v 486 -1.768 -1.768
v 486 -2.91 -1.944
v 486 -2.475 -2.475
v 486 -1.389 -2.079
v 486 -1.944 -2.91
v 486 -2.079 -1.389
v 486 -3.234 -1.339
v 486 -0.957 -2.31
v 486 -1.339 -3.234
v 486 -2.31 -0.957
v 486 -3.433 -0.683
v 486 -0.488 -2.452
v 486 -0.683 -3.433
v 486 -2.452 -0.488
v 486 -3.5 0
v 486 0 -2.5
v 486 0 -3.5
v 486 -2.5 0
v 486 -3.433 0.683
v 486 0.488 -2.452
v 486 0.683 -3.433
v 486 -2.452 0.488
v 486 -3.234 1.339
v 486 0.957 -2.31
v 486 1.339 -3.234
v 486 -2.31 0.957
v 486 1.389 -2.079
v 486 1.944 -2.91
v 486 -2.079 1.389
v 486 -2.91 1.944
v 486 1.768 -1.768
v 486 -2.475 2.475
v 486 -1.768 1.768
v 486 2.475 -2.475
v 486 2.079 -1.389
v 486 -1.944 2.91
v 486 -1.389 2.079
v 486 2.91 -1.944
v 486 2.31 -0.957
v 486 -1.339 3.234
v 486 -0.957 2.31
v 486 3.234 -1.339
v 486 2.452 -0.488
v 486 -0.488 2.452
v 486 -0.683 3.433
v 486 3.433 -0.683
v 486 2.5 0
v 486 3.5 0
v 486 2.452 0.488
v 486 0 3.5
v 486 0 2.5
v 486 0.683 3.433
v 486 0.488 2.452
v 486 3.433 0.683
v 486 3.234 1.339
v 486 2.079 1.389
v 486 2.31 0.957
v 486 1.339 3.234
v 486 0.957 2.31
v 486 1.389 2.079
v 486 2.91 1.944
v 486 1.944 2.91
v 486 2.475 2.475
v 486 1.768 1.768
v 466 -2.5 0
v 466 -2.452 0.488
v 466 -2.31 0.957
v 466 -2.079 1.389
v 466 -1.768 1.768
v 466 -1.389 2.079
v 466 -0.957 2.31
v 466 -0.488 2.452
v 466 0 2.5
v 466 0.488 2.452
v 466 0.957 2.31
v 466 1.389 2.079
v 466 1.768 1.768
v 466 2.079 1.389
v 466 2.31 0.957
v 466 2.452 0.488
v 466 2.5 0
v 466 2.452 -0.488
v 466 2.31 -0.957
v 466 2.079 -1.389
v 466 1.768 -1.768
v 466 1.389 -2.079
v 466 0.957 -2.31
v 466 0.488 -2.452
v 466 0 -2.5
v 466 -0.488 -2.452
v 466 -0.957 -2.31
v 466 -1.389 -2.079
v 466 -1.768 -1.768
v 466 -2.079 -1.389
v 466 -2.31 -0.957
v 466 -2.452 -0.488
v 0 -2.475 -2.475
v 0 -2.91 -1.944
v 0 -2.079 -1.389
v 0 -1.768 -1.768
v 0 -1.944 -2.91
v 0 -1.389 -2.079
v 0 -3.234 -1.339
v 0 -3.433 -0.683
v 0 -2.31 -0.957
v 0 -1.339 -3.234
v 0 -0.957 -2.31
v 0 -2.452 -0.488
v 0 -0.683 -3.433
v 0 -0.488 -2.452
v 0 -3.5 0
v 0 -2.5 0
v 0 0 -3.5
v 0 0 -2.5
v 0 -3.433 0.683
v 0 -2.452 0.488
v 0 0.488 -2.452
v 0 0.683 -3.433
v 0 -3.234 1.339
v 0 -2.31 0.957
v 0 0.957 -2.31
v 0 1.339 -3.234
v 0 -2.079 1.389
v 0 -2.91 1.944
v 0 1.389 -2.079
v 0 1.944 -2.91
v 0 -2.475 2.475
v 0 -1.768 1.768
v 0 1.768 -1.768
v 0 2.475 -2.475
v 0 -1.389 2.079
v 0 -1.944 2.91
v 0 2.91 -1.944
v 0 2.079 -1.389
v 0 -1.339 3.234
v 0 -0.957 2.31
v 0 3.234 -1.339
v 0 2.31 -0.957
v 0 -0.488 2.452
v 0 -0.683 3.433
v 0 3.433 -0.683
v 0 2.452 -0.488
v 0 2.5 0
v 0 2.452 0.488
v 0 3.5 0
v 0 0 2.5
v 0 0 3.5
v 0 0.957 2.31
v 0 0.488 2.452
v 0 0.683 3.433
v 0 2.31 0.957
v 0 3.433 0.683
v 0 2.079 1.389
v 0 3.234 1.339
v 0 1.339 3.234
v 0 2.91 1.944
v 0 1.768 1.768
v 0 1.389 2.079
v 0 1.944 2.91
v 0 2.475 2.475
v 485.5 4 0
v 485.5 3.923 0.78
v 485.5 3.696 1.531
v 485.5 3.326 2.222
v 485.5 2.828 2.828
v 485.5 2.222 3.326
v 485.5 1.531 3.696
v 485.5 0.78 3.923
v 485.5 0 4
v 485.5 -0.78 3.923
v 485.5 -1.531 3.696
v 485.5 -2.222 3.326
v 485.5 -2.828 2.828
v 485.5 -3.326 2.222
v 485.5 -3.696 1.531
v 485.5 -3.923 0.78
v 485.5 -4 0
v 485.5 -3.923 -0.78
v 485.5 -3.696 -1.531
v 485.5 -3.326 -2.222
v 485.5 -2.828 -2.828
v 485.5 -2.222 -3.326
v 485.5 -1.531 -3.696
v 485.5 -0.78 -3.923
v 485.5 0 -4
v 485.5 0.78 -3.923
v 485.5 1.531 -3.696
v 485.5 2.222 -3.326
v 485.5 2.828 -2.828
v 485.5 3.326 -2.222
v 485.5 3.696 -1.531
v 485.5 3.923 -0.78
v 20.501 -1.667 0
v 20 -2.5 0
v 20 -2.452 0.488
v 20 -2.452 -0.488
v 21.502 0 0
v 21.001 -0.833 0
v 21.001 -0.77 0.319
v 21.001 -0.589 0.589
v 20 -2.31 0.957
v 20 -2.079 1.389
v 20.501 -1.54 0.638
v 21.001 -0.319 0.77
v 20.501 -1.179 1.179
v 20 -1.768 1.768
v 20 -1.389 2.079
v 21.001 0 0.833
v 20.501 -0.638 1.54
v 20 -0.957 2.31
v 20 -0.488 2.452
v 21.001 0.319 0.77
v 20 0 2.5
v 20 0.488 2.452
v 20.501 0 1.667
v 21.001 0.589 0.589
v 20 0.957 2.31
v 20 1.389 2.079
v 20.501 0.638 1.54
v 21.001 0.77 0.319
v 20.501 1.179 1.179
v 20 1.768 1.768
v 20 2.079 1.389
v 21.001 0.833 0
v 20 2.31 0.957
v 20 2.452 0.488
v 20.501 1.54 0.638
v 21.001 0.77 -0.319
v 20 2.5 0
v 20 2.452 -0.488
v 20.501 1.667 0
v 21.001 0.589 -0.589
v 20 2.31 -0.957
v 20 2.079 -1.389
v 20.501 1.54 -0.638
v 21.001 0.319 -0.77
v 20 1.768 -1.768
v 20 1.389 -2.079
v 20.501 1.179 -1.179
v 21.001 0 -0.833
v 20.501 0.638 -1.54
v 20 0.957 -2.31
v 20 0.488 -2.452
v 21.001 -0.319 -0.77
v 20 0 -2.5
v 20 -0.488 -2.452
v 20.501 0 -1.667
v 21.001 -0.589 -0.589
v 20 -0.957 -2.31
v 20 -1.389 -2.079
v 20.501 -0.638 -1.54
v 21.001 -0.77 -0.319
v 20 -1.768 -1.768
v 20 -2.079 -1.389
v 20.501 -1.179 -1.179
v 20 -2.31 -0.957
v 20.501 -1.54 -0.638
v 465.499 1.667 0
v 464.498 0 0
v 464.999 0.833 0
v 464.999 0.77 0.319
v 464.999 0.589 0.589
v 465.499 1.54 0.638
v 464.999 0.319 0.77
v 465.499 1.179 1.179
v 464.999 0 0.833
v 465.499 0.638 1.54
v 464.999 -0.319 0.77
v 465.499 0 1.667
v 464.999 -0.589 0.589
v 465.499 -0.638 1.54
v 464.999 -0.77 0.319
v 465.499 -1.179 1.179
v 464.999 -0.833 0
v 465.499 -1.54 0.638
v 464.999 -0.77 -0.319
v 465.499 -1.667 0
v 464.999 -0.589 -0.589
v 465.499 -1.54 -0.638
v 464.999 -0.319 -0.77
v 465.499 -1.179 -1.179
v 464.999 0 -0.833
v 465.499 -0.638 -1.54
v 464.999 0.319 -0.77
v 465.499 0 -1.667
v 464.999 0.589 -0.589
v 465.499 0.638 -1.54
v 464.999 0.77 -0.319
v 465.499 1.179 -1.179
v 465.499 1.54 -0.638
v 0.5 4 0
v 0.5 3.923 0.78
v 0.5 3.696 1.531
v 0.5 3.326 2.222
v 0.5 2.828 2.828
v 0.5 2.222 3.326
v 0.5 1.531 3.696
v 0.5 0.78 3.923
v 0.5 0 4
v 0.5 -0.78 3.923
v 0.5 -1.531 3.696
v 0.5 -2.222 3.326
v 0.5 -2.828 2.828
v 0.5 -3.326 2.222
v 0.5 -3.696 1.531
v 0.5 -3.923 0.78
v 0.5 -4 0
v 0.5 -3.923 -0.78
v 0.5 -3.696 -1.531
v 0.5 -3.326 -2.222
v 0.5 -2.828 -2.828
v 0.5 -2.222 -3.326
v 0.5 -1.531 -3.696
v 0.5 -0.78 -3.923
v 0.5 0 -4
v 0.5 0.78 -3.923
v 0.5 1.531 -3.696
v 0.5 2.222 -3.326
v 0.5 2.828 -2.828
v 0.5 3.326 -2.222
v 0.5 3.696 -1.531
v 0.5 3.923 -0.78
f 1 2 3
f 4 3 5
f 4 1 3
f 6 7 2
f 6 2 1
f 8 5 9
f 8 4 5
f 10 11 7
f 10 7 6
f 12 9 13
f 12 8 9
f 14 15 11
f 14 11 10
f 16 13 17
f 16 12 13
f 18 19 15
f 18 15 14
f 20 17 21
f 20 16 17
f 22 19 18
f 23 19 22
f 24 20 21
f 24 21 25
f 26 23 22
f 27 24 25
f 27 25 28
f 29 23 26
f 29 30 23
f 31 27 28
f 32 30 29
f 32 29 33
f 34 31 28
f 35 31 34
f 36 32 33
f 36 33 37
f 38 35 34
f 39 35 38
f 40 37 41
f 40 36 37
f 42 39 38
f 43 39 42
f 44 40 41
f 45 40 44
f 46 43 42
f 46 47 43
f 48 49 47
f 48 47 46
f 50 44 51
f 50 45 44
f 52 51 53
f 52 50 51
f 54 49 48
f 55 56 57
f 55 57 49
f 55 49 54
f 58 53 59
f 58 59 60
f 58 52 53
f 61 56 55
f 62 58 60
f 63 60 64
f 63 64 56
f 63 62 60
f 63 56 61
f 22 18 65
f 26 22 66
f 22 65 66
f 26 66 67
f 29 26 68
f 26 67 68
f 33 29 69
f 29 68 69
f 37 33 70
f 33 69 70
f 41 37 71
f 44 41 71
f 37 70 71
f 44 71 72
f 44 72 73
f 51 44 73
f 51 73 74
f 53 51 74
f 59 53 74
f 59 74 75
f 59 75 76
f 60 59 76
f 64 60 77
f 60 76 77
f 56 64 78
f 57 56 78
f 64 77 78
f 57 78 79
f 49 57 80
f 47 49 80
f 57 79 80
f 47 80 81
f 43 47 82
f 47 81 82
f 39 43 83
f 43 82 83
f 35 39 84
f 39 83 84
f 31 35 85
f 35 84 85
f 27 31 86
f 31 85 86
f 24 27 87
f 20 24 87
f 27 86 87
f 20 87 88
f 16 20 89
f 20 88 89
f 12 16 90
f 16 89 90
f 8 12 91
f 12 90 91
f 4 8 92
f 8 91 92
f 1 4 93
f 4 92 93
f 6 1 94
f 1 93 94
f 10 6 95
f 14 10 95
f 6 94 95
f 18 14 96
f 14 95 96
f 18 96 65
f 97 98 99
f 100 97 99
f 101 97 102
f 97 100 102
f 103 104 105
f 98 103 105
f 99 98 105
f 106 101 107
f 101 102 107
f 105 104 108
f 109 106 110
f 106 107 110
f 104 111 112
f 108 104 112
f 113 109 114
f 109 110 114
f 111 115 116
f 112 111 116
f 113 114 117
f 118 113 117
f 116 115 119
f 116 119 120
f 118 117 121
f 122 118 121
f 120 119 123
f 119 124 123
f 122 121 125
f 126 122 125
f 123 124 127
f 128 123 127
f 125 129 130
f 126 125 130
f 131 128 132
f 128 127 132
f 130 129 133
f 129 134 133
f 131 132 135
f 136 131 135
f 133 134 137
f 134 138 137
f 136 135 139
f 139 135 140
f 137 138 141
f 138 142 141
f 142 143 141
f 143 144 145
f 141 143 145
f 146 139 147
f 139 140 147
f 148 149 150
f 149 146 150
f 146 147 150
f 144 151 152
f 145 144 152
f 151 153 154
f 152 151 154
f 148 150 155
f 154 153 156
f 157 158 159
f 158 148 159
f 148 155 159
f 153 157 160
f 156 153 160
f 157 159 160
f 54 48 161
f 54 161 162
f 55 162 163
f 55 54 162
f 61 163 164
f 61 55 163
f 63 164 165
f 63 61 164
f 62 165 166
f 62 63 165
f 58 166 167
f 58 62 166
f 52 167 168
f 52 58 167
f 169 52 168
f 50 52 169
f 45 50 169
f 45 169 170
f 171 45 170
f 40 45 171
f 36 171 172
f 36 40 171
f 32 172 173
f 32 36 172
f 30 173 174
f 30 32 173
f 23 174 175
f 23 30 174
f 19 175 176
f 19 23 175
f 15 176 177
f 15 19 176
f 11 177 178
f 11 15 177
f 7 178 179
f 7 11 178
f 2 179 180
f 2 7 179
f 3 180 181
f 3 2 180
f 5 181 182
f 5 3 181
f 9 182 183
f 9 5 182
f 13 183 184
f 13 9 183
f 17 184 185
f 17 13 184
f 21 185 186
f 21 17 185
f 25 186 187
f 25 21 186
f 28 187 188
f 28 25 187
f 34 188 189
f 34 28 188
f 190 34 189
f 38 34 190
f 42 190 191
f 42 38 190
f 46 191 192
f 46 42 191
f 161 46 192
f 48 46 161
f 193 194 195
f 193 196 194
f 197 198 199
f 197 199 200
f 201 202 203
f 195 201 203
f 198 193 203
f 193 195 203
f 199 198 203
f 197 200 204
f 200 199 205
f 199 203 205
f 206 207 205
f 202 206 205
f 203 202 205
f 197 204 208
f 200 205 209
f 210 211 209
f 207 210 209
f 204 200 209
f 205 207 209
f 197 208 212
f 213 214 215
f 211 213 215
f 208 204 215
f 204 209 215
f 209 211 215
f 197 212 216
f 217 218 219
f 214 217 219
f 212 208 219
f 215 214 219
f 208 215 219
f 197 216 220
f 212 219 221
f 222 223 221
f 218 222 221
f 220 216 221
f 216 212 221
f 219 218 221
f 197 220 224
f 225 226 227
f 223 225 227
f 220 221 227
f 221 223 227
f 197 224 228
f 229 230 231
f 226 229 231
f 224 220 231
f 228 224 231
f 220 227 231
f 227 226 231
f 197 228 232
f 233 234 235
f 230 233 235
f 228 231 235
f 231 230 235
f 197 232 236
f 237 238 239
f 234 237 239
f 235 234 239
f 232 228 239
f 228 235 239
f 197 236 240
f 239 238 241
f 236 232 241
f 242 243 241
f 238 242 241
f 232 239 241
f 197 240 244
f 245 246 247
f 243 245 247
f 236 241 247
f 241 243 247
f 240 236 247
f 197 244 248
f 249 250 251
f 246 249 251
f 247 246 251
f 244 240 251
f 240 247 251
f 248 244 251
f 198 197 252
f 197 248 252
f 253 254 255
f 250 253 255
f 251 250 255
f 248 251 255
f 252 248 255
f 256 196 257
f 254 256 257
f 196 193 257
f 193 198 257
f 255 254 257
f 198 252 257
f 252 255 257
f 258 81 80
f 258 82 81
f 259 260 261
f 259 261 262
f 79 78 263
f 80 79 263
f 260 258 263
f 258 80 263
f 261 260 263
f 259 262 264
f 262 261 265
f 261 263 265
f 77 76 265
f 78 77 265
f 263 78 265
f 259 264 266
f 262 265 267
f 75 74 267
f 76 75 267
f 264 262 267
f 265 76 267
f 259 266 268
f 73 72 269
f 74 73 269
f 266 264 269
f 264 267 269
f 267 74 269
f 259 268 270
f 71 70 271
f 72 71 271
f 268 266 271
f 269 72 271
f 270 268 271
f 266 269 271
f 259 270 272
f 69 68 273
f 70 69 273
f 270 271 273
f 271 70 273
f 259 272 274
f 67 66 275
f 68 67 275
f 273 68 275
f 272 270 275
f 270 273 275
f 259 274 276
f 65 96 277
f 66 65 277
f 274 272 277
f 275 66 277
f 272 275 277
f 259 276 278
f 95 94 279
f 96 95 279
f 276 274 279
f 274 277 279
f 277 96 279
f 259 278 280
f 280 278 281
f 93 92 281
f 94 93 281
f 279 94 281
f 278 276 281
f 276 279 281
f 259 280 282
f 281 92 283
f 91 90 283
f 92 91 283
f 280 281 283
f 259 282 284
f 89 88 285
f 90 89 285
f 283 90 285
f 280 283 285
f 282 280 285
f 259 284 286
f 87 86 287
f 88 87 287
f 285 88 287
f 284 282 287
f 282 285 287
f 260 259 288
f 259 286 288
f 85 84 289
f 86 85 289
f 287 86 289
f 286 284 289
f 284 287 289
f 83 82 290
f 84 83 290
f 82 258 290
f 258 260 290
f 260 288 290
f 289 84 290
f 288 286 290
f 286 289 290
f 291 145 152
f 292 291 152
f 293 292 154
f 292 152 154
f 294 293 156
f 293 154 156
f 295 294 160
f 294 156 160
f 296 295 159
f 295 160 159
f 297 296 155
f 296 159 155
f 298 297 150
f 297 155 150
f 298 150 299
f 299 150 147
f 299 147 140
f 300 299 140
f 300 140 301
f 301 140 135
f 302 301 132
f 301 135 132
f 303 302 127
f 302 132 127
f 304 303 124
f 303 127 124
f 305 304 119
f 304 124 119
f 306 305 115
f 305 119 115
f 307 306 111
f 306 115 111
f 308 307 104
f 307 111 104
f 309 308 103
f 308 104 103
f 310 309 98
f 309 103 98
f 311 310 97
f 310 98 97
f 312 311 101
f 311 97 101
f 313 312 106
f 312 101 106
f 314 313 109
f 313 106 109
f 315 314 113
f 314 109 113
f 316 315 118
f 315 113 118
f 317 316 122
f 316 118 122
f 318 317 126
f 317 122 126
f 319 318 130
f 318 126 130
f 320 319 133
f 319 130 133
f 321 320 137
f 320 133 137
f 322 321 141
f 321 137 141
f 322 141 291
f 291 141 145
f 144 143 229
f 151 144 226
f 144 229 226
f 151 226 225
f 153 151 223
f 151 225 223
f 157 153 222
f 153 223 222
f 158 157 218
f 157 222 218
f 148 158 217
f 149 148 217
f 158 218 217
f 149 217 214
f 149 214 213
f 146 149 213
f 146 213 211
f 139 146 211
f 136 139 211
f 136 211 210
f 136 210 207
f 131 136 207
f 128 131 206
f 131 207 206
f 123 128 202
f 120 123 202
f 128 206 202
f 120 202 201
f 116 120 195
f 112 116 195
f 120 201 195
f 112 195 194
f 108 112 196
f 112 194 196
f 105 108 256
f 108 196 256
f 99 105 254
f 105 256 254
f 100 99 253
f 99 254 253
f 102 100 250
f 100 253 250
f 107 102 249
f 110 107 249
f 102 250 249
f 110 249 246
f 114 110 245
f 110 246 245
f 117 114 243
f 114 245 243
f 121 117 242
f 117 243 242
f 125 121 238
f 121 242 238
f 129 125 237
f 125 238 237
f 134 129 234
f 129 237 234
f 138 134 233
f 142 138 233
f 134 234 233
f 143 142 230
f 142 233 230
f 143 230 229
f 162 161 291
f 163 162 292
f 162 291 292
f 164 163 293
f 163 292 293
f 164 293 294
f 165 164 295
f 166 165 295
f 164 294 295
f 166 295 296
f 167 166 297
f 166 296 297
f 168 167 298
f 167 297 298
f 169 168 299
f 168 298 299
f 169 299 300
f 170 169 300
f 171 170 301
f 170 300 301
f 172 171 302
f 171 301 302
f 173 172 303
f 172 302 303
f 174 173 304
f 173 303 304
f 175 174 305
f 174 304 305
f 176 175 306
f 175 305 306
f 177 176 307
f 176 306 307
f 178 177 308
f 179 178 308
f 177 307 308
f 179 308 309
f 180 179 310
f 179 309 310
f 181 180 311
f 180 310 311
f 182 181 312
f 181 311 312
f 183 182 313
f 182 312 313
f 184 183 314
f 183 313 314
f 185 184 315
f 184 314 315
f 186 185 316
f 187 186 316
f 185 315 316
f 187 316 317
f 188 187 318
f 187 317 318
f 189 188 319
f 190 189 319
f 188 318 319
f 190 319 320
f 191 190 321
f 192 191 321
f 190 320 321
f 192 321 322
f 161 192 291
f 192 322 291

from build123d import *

# Parameters (mm, degrees)
F0_R           = 4
F1_DEPTH       = 486
F4_D           = 5
F4_DEPTH       = 20
F4_TIP         = 1.5021515476
F4_ON_F2_D     = 5
F4_ON_F2_DEPTH = 20
F4_ON_F2_TIP   = 1.5021515476
F5_SIZE        = 0.5


with BuildPart() as f1:
    # F0 (on Right) → F1 (new body)
    with BuildSketch(Plane.YZ):
        Circle(F0_R)
    extrude(amount=F1_DEPTH)

    # F4
    with Locations(Plane(origin=(0, 0, 0), x_dir=(0, -1, 0), z_dir=(-1, 0, 0))):
        with Locations((0, 0)):
            Hole(F4_D / 2, depth=F4_DEPTH)
            with Locations((0, 0, -(F4_DEPTH + F4_TIP / 2))):  # 118° drill point
                Cone(0, F4_D / 2, F4_TIP, mode=Mode.SUBTRACT)

    # F4 on F2
    with Locations(Plane.YZ.offset(486)):
        with Locations((0, 0)):
            Hole(F4_ON_F2_D / 2, depth=F4_ON_F2_DEPTH)
            with Locations((0, 0, -(F4_ON_F2_DEPTH + F4_ON_F2_TIP / 2))):  # 118° drill point
                Cone(0, F4_ON_F2_D / 2, F4_ON_F2_TIP, mode=Mode.SUBTRACT)

    # F5
    f5_edges = [f1.edges().sort_by_distance(p)[0] for p in [
        (486, -4, 0),
        (0, -4, 0),
    ]]
    chamfer(f5_edges, length=F5_SIZE)


solid = f1.part
